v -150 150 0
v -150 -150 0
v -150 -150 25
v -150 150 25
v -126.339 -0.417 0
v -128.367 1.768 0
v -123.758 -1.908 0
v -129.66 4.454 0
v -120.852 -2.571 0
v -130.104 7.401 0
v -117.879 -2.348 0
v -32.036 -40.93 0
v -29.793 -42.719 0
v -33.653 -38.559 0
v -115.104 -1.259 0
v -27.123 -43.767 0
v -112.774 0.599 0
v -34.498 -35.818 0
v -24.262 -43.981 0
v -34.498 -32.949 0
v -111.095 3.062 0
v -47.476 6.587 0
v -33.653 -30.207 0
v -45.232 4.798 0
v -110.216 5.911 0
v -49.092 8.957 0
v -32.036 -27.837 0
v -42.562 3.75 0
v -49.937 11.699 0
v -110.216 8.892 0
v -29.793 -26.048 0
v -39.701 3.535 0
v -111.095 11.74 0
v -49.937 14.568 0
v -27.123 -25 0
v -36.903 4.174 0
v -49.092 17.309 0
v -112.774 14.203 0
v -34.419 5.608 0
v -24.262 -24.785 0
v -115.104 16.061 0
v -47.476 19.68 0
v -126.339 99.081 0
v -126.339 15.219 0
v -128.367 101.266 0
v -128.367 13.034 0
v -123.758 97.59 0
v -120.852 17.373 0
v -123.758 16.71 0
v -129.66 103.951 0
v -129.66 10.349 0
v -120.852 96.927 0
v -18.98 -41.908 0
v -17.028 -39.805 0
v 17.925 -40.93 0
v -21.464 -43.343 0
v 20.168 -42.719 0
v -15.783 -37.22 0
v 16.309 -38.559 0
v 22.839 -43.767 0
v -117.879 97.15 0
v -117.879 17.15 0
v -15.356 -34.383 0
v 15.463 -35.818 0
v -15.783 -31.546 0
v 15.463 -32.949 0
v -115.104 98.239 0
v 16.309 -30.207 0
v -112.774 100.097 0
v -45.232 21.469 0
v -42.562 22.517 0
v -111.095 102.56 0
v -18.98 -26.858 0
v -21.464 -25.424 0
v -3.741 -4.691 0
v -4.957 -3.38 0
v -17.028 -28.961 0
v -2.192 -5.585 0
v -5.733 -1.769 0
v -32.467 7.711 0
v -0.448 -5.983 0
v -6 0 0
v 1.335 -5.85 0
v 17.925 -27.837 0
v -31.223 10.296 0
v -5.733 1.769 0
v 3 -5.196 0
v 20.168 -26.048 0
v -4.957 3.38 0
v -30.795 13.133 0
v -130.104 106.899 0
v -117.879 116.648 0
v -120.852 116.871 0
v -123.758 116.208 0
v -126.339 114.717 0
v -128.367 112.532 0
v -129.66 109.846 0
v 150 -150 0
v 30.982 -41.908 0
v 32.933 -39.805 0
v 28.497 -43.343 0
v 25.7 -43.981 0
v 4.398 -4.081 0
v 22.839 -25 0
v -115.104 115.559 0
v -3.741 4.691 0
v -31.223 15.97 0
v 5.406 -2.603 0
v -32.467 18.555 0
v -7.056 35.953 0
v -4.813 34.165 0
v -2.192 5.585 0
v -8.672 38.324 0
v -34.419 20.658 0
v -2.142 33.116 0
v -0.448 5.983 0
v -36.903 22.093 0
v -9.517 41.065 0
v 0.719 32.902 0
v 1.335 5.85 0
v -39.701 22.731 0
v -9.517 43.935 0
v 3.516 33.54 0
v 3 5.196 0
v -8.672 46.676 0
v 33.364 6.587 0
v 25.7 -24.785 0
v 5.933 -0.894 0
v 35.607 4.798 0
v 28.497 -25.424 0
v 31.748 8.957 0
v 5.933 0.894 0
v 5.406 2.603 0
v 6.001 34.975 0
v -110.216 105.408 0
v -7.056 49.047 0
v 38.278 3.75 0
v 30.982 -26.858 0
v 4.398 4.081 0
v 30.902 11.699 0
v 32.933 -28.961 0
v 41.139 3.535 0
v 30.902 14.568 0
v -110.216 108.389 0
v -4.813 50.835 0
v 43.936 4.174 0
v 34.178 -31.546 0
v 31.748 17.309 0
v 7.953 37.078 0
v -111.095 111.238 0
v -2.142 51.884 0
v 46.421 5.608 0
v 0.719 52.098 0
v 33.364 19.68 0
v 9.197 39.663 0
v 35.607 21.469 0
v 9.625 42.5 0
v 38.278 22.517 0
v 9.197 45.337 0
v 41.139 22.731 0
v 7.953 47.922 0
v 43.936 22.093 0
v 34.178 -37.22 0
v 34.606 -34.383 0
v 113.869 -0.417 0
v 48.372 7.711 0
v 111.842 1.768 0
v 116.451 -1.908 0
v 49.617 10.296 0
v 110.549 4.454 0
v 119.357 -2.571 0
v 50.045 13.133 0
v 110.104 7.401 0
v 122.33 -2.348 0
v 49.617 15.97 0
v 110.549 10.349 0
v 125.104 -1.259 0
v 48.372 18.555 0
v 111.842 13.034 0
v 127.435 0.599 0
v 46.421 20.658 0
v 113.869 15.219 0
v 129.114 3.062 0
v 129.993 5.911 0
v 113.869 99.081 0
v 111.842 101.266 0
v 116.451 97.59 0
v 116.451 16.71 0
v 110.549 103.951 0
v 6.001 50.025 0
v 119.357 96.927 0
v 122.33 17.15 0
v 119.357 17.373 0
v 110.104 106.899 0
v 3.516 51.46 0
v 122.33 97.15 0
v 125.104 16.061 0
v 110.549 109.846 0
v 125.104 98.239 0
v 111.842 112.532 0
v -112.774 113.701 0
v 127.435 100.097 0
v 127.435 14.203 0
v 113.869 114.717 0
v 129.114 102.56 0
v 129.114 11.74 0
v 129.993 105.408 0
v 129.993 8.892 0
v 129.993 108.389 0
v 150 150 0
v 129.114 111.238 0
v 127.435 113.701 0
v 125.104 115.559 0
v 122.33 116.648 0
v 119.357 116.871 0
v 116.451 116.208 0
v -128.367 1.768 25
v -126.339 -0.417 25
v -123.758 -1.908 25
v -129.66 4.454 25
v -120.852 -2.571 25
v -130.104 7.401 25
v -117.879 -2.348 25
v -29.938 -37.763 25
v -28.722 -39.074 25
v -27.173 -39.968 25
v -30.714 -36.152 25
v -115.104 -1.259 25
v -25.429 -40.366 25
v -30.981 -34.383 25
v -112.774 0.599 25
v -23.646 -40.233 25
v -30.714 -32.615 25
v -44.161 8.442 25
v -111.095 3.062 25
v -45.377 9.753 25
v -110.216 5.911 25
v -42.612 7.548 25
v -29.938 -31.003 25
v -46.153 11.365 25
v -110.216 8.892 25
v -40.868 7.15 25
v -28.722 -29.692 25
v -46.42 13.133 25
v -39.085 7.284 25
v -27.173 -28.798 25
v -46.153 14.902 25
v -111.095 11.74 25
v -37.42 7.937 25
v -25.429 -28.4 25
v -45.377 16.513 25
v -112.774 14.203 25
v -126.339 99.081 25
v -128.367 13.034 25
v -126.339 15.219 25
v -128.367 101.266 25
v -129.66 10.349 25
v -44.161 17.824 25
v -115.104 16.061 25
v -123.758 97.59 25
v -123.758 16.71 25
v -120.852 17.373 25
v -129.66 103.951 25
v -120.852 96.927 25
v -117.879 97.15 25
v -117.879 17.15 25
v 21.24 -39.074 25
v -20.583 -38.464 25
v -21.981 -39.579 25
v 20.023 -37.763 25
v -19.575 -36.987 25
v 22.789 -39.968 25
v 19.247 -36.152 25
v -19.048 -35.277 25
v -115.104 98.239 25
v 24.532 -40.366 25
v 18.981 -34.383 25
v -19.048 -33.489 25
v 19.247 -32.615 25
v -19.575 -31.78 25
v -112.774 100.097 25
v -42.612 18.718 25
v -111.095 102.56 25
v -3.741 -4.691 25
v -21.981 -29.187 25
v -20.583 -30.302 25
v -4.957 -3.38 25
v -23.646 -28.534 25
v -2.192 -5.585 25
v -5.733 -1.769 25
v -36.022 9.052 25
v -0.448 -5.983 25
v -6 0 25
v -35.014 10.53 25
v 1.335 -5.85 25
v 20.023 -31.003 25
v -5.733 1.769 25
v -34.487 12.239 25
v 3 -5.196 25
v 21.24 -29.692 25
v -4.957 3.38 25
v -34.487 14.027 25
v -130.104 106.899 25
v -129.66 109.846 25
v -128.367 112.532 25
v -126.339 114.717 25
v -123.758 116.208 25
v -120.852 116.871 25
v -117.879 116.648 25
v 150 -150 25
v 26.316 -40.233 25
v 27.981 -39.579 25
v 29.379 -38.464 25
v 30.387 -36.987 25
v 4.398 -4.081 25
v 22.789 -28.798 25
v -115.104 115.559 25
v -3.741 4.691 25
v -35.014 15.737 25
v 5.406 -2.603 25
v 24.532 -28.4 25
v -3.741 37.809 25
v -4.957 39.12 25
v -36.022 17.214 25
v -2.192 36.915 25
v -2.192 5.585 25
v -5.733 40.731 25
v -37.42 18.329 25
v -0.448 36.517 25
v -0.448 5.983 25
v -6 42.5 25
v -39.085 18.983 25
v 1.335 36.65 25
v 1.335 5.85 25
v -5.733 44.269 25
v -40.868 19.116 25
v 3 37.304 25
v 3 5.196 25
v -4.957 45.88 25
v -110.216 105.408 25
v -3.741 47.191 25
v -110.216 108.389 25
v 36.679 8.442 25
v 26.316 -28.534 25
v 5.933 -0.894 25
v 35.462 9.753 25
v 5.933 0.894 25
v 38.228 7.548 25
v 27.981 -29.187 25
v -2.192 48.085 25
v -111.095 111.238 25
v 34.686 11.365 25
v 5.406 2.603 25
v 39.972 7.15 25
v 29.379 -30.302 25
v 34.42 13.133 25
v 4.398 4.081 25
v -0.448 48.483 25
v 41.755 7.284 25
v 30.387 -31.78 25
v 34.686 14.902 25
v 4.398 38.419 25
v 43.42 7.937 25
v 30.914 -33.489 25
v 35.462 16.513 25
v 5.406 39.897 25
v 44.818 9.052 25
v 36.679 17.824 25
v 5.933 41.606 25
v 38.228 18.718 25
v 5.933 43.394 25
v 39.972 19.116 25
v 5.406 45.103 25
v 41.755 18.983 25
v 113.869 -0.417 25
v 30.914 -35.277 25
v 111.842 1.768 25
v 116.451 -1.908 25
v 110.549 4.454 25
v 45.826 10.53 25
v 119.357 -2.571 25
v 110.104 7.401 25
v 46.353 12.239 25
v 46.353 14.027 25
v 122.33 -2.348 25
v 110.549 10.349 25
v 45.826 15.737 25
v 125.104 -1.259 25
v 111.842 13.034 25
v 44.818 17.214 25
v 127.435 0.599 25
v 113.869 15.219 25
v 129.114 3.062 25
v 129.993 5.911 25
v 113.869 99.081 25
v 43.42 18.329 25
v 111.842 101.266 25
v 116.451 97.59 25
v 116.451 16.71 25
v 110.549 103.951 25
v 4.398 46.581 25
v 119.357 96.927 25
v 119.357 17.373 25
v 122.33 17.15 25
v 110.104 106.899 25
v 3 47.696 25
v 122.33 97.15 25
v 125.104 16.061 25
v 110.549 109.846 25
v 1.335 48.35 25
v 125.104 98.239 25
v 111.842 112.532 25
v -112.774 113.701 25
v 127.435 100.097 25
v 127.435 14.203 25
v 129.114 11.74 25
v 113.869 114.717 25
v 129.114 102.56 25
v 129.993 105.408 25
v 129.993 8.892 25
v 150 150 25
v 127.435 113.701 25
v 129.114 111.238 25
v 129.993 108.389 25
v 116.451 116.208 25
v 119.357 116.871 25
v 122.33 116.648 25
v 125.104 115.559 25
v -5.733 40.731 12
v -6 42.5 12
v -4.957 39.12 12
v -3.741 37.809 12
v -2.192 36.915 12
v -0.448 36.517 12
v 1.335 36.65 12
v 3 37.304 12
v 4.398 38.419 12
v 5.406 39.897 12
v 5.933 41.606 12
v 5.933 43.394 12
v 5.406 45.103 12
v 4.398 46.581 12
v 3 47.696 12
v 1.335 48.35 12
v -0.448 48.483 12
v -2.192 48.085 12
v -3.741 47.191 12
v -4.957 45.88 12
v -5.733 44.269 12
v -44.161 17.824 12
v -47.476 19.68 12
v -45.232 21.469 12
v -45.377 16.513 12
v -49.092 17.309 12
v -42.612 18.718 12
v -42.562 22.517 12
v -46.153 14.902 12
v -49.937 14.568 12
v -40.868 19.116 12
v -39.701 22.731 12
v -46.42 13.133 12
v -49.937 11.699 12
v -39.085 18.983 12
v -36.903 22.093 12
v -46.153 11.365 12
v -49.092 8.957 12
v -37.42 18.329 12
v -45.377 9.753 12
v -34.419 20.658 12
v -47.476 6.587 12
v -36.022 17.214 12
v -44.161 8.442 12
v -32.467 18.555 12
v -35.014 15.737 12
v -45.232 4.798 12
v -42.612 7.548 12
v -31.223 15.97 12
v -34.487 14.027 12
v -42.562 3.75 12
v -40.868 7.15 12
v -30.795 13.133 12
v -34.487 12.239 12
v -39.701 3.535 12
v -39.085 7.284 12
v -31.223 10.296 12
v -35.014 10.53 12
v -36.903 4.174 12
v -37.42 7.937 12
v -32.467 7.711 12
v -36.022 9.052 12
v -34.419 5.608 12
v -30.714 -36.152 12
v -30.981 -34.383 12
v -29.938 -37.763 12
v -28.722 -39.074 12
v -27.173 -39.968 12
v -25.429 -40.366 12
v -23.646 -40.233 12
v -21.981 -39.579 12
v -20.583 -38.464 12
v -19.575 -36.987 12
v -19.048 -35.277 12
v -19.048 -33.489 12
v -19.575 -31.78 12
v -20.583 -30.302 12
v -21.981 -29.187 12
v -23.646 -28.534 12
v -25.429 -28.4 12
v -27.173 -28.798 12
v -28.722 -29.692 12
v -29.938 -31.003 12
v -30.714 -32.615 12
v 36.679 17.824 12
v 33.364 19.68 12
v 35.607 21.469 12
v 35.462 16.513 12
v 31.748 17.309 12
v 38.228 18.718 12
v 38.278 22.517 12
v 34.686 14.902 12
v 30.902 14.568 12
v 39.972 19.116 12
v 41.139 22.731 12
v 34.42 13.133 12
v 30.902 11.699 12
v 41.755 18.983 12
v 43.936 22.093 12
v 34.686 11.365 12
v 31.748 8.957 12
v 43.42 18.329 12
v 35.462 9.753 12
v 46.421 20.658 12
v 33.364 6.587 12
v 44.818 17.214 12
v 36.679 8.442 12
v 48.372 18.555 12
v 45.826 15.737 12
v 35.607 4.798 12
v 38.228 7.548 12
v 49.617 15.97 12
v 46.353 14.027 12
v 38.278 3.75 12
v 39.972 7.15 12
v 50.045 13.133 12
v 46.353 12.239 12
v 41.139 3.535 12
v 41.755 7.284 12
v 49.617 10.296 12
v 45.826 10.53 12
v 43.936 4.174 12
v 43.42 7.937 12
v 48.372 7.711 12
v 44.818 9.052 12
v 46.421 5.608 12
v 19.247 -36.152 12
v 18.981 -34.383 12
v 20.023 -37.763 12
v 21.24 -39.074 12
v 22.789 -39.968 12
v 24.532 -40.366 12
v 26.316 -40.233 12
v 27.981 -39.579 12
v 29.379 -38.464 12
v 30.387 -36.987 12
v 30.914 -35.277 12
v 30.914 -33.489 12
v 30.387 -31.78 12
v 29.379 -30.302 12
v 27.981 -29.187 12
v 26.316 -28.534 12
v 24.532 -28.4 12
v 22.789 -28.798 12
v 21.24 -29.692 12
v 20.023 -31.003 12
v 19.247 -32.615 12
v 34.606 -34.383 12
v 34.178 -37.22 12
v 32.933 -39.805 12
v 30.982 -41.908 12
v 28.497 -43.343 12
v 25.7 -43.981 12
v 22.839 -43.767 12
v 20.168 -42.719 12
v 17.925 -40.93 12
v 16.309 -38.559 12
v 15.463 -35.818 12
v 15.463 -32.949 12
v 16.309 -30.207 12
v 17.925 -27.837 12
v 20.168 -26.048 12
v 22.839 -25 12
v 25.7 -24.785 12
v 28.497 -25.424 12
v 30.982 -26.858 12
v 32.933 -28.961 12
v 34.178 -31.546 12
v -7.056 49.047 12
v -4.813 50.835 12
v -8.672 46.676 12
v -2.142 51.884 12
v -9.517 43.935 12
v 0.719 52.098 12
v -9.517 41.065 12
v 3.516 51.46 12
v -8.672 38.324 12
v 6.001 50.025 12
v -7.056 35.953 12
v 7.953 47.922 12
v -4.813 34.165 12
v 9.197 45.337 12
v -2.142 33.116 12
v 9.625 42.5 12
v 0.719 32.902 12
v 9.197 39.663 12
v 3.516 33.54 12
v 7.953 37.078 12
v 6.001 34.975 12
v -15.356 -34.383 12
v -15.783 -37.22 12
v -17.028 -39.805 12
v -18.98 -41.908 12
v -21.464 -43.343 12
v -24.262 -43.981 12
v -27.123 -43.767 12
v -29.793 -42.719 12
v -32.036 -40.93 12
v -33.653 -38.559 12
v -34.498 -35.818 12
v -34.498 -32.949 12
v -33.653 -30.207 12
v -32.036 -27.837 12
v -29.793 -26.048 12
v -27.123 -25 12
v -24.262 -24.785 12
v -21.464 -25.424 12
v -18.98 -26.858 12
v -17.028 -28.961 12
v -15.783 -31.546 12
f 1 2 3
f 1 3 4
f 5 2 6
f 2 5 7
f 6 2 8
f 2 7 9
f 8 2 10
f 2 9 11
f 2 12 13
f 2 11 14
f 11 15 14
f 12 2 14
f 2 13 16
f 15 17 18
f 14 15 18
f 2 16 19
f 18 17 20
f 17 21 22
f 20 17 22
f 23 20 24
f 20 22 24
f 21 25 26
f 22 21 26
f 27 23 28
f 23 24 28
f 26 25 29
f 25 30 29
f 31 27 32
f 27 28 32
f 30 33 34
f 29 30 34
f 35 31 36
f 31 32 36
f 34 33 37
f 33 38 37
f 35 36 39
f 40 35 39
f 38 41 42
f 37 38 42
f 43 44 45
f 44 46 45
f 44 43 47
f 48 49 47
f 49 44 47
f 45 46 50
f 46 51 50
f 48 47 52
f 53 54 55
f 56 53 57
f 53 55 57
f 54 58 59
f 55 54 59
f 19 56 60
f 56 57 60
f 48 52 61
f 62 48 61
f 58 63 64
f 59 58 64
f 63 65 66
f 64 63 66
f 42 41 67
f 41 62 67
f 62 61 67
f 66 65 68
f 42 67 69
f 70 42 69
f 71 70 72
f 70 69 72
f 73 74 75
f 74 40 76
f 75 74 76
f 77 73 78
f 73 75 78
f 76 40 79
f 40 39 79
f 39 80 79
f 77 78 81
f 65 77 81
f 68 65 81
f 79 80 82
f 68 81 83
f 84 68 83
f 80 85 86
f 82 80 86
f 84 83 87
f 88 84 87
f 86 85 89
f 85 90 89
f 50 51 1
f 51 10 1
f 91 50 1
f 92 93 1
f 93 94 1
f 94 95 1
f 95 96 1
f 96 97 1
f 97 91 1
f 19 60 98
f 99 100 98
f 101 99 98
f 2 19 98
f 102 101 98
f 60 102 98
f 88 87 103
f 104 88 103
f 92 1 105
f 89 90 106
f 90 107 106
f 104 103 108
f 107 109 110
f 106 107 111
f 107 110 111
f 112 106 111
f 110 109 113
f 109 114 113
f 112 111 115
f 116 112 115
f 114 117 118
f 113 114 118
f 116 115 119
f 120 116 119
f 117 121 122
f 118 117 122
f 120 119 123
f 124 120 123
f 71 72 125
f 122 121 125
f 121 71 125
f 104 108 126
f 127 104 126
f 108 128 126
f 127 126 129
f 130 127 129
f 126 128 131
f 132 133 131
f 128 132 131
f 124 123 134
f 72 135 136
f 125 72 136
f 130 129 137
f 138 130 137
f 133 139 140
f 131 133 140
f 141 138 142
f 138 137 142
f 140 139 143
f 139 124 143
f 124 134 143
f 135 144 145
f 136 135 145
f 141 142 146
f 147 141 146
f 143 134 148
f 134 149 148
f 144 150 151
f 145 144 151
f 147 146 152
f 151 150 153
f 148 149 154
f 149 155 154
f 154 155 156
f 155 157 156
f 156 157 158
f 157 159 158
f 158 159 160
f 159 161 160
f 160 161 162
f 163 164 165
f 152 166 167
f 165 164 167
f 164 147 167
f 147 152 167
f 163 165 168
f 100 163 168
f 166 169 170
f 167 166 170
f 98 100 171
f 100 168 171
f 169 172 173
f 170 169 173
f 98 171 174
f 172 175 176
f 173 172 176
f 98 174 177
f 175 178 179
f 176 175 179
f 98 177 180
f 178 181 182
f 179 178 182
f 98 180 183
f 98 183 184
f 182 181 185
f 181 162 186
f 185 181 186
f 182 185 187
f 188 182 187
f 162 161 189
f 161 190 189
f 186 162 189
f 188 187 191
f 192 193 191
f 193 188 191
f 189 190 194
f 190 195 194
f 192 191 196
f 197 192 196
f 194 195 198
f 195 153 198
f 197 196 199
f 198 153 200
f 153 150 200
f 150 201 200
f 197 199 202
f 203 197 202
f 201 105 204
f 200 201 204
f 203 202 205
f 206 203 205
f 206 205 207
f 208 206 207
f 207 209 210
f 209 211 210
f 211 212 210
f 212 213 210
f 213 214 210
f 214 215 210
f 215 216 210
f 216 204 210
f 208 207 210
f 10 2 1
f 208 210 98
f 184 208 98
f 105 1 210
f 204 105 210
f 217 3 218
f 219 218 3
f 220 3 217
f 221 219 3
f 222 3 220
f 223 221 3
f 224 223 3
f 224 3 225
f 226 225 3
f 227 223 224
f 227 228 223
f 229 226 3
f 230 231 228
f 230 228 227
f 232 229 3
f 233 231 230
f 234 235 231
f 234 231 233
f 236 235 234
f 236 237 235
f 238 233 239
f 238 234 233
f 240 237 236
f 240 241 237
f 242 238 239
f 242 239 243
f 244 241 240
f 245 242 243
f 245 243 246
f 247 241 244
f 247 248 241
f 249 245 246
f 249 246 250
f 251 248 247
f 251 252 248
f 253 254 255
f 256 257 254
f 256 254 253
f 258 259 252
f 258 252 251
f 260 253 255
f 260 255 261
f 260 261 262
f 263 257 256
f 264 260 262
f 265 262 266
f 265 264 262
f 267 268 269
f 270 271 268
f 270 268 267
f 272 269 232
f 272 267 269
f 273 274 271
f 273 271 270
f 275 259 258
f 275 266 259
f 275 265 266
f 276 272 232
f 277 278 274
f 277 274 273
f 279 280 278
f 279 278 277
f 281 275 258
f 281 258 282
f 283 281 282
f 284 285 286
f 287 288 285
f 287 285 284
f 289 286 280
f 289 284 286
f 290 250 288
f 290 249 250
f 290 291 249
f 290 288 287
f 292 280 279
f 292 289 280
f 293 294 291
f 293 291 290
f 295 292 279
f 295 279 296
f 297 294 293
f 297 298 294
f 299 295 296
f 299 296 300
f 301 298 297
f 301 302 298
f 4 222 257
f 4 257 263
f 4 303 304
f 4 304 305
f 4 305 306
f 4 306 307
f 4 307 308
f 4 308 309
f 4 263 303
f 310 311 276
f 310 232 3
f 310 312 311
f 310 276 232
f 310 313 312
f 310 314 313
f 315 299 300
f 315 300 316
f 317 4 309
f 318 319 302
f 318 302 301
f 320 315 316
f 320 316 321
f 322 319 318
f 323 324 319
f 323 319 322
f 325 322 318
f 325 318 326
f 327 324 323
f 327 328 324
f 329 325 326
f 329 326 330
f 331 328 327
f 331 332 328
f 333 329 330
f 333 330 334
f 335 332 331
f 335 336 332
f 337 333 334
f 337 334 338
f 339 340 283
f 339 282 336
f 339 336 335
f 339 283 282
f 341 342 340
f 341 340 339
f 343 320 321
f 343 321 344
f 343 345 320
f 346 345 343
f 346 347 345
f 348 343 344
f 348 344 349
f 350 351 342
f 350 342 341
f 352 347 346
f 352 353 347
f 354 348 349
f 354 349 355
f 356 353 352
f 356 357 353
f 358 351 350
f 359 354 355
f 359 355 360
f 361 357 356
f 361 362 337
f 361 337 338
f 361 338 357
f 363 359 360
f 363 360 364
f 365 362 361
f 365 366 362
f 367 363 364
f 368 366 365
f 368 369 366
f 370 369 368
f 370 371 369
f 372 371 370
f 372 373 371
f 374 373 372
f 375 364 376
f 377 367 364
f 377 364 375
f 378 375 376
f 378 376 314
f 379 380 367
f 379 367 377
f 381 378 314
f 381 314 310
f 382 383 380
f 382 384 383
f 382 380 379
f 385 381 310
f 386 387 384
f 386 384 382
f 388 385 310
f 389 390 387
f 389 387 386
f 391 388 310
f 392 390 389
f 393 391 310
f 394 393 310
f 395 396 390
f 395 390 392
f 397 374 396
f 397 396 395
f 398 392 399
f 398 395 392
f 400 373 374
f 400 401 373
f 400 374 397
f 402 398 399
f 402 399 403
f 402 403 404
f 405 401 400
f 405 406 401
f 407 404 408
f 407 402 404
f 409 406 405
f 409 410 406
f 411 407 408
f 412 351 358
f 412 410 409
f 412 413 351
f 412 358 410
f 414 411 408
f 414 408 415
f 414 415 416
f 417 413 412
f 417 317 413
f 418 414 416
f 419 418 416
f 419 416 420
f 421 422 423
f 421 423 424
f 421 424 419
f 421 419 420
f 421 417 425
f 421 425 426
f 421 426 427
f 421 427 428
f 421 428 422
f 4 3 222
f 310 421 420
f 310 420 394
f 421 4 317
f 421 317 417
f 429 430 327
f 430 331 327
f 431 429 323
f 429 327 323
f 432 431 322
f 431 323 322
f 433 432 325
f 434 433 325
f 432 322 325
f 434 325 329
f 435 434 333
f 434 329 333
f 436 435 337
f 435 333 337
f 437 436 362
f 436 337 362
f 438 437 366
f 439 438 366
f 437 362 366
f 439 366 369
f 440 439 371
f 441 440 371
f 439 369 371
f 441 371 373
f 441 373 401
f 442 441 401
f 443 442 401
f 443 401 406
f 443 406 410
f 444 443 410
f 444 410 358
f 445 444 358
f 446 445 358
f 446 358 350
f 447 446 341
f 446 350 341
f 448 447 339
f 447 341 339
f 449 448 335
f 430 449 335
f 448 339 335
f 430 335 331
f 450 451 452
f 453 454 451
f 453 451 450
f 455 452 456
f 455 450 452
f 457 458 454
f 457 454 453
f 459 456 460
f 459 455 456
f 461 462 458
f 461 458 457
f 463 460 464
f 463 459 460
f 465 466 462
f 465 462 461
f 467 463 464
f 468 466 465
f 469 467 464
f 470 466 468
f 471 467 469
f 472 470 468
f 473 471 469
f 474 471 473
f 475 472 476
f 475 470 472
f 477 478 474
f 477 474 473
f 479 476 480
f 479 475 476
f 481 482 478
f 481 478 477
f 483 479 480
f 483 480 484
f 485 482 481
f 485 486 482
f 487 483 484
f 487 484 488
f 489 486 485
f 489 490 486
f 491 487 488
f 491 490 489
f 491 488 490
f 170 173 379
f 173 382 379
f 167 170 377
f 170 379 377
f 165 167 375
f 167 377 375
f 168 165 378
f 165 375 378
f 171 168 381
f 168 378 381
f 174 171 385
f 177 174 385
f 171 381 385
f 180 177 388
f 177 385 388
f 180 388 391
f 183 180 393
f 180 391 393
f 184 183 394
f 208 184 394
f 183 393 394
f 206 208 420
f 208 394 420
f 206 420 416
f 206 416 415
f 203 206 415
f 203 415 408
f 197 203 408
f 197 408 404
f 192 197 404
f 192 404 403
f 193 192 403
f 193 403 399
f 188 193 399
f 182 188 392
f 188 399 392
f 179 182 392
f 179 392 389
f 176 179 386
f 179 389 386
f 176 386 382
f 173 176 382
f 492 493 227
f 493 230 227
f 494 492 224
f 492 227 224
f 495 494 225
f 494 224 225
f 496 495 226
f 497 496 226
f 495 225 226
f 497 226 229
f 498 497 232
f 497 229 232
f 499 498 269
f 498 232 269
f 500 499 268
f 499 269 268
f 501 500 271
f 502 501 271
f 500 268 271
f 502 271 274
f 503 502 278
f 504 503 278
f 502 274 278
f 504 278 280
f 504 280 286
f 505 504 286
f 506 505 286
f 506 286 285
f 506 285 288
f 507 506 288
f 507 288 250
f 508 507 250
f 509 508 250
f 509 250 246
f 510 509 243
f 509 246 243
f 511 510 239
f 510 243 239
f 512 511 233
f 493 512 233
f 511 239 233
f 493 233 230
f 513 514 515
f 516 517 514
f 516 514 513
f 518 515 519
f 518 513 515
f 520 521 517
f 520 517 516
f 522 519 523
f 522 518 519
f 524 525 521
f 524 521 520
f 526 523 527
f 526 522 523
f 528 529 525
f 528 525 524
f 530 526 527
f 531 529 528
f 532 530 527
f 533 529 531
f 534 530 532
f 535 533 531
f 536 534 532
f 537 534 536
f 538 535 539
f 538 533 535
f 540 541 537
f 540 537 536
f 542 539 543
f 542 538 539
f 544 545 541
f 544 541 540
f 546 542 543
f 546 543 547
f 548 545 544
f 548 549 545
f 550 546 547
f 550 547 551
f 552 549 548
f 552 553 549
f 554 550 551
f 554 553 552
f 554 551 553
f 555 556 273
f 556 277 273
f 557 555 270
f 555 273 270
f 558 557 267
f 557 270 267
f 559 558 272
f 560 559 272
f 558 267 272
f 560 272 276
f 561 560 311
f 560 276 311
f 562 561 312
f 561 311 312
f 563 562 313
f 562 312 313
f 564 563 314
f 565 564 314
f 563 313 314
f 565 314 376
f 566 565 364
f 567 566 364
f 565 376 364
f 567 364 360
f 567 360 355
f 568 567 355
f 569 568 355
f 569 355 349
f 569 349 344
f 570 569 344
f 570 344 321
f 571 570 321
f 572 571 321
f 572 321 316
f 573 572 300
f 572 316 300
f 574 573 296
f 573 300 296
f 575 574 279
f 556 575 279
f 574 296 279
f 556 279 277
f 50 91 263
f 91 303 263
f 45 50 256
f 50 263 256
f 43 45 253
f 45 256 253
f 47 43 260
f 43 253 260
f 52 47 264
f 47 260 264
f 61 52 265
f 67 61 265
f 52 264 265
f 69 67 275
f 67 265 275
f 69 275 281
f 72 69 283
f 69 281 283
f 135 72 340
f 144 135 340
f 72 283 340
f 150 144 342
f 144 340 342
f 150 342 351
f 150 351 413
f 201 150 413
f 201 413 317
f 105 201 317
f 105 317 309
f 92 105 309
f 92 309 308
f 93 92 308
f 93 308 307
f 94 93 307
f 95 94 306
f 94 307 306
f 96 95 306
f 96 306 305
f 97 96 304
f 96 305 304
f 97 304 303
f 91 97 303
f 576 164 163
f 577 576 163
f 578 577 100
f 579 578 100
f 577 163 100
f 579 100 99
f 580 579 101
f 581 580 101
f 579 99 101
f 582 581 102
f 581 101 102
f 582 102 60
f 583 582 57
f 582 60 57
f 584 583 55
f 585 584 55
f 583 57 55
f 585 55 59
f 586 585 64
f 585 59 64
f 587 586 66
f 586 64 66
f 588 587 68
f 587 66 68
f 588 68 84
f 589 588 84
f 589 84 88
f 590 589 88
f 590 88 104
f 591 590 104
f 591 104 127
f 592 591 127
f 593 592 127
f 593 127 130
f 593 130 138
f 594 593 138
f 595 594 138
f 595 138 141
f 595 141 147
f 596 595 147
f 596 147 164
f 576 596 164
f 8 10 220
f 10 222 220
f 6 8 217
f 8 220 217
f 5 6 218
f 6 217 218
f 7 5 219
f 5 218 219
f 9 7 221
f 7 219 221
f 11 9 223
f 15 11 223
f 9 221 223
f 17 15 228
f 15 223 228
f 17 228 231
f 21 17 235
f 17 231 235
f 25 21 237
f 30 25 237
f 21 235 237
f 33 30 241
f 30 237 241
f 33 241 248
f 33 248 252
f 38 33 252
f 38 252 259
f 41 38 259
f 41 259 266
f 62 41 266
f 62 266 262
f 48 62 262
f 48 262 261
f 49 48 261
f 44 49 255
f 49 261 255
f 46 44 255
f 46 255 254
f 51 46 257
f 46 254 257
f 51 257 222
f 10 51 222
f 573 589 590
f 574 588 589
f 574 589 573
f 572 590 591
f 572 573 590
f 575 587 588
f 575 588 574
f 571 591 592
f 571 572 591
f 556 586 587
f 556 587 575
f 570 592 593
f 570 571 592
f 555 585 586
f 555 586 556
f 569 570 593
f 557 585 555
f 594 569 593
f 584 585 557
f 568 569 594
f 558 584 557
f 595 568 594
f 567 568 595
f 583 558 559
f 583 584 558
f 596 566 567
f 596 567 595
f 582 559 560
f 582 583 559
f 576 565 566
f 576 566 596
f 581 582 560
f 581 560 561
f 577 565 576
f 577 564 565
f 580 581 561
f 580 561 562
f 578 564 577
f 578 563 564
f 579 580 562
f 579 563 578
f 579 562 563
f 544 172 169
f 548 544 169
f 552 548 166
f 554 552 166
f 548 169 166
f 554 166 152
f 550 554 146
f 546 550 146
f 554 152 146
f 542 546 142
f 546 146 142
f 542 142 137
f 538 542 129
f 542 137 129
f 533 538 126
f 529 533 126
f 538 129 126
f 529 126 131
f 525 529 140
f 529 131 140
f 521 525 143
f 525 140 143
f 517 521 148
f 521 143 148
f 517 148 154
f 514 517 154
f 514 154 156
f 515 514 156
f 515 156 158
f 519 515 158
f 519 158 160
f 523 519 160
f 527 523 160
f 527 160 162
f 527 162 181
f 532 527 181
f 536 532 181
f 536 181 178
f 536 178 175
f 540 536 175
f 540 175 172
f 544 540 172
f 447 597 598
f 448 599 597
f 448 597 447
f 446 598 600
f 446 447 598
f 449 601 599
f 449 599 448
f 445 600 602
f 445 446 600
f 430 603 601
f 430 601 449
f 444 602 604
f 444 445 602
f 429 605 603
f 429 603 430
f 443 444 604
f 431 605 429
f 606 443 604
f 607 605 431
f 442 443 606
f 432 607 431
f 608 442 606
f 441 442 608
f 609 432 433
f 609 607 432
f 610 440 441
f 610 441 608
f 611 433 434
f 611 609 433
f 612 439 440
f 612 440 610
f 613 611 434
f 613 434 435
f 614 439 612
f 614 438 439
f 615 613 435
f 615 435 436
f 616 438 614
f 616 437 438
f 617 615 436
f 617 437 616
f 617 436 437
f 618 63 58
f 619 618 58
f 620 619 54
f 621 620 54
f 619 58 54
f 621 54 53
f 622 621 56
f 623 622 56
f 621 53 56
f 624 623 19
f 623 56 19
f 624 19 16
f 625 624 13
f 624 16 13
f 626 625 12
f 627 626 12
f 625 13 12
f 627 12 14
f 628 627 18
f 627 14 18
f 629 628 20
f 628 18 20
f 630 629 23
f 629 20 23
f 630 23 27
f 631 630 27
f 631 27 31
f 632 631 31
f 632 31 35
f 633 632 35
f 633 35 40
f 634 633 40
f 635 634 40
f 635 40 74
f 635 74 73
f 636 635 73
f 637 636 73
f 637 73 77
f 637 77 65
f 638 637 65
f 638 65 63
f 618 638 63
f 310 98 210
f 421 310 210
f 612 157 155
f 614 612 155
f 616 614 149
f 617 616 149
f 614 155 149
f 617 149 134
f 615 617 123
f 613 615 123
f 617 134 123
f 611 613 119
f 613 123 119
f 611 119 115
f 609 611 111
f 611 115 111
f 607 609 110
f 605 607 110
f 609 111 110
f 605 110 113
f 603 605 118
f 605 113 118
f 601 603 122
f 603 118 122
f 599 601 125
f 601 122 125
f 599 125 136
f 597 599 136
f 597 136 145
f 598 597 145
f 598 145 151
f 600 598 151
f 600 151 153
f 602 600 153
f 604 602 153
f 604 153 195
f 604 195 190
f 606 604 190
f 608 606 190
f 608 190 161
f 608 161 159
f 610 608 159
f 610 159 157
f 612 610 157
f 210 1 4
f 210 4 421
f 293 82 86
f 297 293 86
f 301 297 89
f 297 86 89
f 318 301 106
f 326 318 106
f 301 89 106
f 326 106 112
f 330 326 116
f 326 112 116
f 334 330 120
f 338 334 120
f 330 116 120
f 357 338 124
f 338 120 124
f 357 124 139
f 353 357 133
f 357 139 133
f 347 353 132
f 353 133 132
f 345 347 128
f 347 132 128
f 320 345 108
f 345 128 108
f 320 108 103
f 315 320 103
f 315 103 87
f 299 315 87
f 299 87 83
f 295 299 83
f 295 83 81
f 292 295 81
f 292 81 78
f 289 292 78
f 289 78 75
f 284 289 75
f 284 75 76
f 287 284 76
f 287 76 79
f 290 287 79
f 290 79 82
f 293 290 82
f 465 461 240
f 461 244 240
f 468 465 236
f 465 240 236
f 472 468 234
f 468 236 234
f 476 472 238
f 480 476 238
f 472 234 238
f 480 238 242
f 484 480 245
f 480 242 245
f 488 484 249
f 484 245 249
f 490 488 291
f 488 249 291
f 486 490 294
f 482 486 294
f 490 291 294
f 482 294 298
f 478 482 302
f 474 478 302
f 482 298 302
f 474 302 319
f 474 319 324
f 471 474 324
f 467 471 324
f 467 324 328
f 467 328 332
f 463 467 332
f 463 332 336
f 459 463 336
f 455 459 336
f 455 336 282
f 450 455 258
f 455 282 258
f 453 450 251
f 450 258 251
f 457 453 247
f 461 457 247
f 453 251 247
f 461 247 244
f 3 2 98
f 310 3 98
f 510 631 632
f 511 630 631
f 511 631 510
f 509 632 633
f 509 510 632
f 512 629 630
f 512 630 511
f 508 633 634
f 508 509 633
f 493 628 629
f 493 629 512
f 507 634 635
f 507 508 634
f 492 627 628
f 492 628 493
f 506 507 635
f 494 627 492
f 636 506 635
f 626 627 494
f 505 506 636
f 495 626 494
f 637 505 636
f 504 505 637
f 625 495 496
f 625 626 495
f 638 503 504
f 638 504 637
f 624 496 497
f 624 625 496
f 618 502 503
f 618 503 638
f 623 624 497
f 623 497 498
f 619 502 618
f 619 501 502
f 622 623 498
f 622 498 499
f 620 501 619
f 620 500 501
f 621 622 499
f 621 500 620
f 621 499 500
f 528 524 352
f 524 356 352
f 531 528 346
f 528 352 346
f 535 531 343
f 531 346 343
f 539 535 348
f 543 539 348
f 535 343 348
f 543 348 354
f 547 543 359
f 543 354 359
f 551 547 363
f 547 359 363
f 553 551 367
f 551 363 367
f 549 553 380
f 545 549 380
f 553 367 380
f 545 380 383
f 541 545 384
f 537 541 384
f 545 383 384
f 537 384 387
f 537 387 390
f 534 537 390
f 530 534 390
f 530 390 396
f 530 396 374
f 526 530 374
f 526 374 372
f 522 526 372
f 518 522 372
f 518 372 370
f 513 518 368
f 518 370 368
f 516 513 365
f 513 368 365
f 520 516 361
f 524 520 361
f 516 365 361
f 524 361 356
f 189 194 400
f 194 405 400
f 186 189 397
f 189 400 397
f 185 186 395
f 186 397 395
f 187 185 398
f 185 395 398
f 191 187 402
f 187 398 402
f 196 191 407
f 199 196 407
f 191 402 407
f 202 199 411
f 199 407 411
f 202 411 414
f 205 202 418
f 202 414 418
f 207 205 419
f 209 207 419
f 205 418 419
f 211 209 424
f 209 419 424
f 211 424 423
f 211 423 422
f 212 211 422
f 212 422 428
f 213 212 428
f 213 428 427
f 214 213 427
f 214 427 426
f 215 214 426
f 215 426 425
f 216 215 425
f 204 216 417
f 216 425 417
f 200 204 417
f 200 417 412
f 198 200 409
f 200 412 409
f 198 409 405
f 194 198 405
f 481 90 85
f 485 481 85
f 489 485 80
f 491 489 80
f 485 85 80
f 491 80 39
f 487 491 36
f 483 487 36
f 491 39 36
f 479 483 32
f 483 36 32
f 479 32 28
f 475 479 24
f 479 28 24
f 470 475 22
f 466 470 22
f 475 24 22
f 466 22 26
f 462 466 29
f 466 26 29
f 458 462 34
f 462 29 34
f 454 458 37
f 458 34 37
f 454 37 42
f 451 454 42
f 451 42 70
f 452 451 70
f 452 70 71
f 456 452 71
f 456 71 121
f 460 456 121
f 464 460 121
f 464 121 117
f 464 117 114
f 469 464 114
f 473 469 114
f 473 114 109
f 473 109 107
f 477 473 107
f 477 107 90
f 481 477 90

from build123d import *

# Parameters (mm, degrees)
F0_W           = 300
F0_H           = 300
F1_DEPTH       = 25
F4_D           = 12
F4_DEPTH       = 35.25
F4_CBORE_D     = 19.25
F4_CBORE_DEPTH = 12
F4_TIP         = 3.6051637142
F5_D           = 12
F6_D           = 20
F6_DEPTH       = 25
F6_TIP         = 6.0086061903


with BuildPart() as f1:
    # F0 (on Top) → F1 (new body)
    with BuildSketch(Plane.XY):
        Rectangle(F0_W, F0_H)
    extrude(amount=F1_DEPTH)

    # F4
    with Locations(Plane(origin=(0, 0, 0), x_dir=(1, 0, 0), z_dir=(0, 0, -1))):
        with Locations((0, -42.5), (-40.4199019425, -13.1332222609), (-24.9808732224, 34.3832222609), (24.9808732224, 34.3832222609), (40.4199019425, -13.1332222609)):
            CounterBoreHole(F4_D / 2, F4_CBORE_D / 2, F4_CBORE_DEPTH, depth=F4_DEPTH)
            with Locations((0, 0, -(F4_DEPTH + F4_TIP / 2))):  # 118° drill point
                Cone(0, F4_D / 2, F4_TIP, mode=Mode.SUBTRACT)

    # F5 (through all)
    with Locations(Plane.XY.offset(25)):
        with Locations((0, 0)):
            Hole(F5_D / 2)

    # F6
    with Locations(Plane(origin=(0, 0, 0), x_dir=(1, 0, 0), z_dir=(0, 0, -1))):
        with Locations((-120.1043392265, -106.8988462075), (-120.1043392265, -7.4011537925), (120.1043392265, -7.4011537925), (120.1043392265, -106.8988462075)):
            Hole(F6_D / 2, depth=F6_DEPTH)
            with Locations((0, 0, -(F6_DEPTH + F6_TIP / 2))):  # 118° drill point
                Cone(0, F6_D / 2, F6_TIP, mode=Mode.SUBTRACT)


solid = f1.part
